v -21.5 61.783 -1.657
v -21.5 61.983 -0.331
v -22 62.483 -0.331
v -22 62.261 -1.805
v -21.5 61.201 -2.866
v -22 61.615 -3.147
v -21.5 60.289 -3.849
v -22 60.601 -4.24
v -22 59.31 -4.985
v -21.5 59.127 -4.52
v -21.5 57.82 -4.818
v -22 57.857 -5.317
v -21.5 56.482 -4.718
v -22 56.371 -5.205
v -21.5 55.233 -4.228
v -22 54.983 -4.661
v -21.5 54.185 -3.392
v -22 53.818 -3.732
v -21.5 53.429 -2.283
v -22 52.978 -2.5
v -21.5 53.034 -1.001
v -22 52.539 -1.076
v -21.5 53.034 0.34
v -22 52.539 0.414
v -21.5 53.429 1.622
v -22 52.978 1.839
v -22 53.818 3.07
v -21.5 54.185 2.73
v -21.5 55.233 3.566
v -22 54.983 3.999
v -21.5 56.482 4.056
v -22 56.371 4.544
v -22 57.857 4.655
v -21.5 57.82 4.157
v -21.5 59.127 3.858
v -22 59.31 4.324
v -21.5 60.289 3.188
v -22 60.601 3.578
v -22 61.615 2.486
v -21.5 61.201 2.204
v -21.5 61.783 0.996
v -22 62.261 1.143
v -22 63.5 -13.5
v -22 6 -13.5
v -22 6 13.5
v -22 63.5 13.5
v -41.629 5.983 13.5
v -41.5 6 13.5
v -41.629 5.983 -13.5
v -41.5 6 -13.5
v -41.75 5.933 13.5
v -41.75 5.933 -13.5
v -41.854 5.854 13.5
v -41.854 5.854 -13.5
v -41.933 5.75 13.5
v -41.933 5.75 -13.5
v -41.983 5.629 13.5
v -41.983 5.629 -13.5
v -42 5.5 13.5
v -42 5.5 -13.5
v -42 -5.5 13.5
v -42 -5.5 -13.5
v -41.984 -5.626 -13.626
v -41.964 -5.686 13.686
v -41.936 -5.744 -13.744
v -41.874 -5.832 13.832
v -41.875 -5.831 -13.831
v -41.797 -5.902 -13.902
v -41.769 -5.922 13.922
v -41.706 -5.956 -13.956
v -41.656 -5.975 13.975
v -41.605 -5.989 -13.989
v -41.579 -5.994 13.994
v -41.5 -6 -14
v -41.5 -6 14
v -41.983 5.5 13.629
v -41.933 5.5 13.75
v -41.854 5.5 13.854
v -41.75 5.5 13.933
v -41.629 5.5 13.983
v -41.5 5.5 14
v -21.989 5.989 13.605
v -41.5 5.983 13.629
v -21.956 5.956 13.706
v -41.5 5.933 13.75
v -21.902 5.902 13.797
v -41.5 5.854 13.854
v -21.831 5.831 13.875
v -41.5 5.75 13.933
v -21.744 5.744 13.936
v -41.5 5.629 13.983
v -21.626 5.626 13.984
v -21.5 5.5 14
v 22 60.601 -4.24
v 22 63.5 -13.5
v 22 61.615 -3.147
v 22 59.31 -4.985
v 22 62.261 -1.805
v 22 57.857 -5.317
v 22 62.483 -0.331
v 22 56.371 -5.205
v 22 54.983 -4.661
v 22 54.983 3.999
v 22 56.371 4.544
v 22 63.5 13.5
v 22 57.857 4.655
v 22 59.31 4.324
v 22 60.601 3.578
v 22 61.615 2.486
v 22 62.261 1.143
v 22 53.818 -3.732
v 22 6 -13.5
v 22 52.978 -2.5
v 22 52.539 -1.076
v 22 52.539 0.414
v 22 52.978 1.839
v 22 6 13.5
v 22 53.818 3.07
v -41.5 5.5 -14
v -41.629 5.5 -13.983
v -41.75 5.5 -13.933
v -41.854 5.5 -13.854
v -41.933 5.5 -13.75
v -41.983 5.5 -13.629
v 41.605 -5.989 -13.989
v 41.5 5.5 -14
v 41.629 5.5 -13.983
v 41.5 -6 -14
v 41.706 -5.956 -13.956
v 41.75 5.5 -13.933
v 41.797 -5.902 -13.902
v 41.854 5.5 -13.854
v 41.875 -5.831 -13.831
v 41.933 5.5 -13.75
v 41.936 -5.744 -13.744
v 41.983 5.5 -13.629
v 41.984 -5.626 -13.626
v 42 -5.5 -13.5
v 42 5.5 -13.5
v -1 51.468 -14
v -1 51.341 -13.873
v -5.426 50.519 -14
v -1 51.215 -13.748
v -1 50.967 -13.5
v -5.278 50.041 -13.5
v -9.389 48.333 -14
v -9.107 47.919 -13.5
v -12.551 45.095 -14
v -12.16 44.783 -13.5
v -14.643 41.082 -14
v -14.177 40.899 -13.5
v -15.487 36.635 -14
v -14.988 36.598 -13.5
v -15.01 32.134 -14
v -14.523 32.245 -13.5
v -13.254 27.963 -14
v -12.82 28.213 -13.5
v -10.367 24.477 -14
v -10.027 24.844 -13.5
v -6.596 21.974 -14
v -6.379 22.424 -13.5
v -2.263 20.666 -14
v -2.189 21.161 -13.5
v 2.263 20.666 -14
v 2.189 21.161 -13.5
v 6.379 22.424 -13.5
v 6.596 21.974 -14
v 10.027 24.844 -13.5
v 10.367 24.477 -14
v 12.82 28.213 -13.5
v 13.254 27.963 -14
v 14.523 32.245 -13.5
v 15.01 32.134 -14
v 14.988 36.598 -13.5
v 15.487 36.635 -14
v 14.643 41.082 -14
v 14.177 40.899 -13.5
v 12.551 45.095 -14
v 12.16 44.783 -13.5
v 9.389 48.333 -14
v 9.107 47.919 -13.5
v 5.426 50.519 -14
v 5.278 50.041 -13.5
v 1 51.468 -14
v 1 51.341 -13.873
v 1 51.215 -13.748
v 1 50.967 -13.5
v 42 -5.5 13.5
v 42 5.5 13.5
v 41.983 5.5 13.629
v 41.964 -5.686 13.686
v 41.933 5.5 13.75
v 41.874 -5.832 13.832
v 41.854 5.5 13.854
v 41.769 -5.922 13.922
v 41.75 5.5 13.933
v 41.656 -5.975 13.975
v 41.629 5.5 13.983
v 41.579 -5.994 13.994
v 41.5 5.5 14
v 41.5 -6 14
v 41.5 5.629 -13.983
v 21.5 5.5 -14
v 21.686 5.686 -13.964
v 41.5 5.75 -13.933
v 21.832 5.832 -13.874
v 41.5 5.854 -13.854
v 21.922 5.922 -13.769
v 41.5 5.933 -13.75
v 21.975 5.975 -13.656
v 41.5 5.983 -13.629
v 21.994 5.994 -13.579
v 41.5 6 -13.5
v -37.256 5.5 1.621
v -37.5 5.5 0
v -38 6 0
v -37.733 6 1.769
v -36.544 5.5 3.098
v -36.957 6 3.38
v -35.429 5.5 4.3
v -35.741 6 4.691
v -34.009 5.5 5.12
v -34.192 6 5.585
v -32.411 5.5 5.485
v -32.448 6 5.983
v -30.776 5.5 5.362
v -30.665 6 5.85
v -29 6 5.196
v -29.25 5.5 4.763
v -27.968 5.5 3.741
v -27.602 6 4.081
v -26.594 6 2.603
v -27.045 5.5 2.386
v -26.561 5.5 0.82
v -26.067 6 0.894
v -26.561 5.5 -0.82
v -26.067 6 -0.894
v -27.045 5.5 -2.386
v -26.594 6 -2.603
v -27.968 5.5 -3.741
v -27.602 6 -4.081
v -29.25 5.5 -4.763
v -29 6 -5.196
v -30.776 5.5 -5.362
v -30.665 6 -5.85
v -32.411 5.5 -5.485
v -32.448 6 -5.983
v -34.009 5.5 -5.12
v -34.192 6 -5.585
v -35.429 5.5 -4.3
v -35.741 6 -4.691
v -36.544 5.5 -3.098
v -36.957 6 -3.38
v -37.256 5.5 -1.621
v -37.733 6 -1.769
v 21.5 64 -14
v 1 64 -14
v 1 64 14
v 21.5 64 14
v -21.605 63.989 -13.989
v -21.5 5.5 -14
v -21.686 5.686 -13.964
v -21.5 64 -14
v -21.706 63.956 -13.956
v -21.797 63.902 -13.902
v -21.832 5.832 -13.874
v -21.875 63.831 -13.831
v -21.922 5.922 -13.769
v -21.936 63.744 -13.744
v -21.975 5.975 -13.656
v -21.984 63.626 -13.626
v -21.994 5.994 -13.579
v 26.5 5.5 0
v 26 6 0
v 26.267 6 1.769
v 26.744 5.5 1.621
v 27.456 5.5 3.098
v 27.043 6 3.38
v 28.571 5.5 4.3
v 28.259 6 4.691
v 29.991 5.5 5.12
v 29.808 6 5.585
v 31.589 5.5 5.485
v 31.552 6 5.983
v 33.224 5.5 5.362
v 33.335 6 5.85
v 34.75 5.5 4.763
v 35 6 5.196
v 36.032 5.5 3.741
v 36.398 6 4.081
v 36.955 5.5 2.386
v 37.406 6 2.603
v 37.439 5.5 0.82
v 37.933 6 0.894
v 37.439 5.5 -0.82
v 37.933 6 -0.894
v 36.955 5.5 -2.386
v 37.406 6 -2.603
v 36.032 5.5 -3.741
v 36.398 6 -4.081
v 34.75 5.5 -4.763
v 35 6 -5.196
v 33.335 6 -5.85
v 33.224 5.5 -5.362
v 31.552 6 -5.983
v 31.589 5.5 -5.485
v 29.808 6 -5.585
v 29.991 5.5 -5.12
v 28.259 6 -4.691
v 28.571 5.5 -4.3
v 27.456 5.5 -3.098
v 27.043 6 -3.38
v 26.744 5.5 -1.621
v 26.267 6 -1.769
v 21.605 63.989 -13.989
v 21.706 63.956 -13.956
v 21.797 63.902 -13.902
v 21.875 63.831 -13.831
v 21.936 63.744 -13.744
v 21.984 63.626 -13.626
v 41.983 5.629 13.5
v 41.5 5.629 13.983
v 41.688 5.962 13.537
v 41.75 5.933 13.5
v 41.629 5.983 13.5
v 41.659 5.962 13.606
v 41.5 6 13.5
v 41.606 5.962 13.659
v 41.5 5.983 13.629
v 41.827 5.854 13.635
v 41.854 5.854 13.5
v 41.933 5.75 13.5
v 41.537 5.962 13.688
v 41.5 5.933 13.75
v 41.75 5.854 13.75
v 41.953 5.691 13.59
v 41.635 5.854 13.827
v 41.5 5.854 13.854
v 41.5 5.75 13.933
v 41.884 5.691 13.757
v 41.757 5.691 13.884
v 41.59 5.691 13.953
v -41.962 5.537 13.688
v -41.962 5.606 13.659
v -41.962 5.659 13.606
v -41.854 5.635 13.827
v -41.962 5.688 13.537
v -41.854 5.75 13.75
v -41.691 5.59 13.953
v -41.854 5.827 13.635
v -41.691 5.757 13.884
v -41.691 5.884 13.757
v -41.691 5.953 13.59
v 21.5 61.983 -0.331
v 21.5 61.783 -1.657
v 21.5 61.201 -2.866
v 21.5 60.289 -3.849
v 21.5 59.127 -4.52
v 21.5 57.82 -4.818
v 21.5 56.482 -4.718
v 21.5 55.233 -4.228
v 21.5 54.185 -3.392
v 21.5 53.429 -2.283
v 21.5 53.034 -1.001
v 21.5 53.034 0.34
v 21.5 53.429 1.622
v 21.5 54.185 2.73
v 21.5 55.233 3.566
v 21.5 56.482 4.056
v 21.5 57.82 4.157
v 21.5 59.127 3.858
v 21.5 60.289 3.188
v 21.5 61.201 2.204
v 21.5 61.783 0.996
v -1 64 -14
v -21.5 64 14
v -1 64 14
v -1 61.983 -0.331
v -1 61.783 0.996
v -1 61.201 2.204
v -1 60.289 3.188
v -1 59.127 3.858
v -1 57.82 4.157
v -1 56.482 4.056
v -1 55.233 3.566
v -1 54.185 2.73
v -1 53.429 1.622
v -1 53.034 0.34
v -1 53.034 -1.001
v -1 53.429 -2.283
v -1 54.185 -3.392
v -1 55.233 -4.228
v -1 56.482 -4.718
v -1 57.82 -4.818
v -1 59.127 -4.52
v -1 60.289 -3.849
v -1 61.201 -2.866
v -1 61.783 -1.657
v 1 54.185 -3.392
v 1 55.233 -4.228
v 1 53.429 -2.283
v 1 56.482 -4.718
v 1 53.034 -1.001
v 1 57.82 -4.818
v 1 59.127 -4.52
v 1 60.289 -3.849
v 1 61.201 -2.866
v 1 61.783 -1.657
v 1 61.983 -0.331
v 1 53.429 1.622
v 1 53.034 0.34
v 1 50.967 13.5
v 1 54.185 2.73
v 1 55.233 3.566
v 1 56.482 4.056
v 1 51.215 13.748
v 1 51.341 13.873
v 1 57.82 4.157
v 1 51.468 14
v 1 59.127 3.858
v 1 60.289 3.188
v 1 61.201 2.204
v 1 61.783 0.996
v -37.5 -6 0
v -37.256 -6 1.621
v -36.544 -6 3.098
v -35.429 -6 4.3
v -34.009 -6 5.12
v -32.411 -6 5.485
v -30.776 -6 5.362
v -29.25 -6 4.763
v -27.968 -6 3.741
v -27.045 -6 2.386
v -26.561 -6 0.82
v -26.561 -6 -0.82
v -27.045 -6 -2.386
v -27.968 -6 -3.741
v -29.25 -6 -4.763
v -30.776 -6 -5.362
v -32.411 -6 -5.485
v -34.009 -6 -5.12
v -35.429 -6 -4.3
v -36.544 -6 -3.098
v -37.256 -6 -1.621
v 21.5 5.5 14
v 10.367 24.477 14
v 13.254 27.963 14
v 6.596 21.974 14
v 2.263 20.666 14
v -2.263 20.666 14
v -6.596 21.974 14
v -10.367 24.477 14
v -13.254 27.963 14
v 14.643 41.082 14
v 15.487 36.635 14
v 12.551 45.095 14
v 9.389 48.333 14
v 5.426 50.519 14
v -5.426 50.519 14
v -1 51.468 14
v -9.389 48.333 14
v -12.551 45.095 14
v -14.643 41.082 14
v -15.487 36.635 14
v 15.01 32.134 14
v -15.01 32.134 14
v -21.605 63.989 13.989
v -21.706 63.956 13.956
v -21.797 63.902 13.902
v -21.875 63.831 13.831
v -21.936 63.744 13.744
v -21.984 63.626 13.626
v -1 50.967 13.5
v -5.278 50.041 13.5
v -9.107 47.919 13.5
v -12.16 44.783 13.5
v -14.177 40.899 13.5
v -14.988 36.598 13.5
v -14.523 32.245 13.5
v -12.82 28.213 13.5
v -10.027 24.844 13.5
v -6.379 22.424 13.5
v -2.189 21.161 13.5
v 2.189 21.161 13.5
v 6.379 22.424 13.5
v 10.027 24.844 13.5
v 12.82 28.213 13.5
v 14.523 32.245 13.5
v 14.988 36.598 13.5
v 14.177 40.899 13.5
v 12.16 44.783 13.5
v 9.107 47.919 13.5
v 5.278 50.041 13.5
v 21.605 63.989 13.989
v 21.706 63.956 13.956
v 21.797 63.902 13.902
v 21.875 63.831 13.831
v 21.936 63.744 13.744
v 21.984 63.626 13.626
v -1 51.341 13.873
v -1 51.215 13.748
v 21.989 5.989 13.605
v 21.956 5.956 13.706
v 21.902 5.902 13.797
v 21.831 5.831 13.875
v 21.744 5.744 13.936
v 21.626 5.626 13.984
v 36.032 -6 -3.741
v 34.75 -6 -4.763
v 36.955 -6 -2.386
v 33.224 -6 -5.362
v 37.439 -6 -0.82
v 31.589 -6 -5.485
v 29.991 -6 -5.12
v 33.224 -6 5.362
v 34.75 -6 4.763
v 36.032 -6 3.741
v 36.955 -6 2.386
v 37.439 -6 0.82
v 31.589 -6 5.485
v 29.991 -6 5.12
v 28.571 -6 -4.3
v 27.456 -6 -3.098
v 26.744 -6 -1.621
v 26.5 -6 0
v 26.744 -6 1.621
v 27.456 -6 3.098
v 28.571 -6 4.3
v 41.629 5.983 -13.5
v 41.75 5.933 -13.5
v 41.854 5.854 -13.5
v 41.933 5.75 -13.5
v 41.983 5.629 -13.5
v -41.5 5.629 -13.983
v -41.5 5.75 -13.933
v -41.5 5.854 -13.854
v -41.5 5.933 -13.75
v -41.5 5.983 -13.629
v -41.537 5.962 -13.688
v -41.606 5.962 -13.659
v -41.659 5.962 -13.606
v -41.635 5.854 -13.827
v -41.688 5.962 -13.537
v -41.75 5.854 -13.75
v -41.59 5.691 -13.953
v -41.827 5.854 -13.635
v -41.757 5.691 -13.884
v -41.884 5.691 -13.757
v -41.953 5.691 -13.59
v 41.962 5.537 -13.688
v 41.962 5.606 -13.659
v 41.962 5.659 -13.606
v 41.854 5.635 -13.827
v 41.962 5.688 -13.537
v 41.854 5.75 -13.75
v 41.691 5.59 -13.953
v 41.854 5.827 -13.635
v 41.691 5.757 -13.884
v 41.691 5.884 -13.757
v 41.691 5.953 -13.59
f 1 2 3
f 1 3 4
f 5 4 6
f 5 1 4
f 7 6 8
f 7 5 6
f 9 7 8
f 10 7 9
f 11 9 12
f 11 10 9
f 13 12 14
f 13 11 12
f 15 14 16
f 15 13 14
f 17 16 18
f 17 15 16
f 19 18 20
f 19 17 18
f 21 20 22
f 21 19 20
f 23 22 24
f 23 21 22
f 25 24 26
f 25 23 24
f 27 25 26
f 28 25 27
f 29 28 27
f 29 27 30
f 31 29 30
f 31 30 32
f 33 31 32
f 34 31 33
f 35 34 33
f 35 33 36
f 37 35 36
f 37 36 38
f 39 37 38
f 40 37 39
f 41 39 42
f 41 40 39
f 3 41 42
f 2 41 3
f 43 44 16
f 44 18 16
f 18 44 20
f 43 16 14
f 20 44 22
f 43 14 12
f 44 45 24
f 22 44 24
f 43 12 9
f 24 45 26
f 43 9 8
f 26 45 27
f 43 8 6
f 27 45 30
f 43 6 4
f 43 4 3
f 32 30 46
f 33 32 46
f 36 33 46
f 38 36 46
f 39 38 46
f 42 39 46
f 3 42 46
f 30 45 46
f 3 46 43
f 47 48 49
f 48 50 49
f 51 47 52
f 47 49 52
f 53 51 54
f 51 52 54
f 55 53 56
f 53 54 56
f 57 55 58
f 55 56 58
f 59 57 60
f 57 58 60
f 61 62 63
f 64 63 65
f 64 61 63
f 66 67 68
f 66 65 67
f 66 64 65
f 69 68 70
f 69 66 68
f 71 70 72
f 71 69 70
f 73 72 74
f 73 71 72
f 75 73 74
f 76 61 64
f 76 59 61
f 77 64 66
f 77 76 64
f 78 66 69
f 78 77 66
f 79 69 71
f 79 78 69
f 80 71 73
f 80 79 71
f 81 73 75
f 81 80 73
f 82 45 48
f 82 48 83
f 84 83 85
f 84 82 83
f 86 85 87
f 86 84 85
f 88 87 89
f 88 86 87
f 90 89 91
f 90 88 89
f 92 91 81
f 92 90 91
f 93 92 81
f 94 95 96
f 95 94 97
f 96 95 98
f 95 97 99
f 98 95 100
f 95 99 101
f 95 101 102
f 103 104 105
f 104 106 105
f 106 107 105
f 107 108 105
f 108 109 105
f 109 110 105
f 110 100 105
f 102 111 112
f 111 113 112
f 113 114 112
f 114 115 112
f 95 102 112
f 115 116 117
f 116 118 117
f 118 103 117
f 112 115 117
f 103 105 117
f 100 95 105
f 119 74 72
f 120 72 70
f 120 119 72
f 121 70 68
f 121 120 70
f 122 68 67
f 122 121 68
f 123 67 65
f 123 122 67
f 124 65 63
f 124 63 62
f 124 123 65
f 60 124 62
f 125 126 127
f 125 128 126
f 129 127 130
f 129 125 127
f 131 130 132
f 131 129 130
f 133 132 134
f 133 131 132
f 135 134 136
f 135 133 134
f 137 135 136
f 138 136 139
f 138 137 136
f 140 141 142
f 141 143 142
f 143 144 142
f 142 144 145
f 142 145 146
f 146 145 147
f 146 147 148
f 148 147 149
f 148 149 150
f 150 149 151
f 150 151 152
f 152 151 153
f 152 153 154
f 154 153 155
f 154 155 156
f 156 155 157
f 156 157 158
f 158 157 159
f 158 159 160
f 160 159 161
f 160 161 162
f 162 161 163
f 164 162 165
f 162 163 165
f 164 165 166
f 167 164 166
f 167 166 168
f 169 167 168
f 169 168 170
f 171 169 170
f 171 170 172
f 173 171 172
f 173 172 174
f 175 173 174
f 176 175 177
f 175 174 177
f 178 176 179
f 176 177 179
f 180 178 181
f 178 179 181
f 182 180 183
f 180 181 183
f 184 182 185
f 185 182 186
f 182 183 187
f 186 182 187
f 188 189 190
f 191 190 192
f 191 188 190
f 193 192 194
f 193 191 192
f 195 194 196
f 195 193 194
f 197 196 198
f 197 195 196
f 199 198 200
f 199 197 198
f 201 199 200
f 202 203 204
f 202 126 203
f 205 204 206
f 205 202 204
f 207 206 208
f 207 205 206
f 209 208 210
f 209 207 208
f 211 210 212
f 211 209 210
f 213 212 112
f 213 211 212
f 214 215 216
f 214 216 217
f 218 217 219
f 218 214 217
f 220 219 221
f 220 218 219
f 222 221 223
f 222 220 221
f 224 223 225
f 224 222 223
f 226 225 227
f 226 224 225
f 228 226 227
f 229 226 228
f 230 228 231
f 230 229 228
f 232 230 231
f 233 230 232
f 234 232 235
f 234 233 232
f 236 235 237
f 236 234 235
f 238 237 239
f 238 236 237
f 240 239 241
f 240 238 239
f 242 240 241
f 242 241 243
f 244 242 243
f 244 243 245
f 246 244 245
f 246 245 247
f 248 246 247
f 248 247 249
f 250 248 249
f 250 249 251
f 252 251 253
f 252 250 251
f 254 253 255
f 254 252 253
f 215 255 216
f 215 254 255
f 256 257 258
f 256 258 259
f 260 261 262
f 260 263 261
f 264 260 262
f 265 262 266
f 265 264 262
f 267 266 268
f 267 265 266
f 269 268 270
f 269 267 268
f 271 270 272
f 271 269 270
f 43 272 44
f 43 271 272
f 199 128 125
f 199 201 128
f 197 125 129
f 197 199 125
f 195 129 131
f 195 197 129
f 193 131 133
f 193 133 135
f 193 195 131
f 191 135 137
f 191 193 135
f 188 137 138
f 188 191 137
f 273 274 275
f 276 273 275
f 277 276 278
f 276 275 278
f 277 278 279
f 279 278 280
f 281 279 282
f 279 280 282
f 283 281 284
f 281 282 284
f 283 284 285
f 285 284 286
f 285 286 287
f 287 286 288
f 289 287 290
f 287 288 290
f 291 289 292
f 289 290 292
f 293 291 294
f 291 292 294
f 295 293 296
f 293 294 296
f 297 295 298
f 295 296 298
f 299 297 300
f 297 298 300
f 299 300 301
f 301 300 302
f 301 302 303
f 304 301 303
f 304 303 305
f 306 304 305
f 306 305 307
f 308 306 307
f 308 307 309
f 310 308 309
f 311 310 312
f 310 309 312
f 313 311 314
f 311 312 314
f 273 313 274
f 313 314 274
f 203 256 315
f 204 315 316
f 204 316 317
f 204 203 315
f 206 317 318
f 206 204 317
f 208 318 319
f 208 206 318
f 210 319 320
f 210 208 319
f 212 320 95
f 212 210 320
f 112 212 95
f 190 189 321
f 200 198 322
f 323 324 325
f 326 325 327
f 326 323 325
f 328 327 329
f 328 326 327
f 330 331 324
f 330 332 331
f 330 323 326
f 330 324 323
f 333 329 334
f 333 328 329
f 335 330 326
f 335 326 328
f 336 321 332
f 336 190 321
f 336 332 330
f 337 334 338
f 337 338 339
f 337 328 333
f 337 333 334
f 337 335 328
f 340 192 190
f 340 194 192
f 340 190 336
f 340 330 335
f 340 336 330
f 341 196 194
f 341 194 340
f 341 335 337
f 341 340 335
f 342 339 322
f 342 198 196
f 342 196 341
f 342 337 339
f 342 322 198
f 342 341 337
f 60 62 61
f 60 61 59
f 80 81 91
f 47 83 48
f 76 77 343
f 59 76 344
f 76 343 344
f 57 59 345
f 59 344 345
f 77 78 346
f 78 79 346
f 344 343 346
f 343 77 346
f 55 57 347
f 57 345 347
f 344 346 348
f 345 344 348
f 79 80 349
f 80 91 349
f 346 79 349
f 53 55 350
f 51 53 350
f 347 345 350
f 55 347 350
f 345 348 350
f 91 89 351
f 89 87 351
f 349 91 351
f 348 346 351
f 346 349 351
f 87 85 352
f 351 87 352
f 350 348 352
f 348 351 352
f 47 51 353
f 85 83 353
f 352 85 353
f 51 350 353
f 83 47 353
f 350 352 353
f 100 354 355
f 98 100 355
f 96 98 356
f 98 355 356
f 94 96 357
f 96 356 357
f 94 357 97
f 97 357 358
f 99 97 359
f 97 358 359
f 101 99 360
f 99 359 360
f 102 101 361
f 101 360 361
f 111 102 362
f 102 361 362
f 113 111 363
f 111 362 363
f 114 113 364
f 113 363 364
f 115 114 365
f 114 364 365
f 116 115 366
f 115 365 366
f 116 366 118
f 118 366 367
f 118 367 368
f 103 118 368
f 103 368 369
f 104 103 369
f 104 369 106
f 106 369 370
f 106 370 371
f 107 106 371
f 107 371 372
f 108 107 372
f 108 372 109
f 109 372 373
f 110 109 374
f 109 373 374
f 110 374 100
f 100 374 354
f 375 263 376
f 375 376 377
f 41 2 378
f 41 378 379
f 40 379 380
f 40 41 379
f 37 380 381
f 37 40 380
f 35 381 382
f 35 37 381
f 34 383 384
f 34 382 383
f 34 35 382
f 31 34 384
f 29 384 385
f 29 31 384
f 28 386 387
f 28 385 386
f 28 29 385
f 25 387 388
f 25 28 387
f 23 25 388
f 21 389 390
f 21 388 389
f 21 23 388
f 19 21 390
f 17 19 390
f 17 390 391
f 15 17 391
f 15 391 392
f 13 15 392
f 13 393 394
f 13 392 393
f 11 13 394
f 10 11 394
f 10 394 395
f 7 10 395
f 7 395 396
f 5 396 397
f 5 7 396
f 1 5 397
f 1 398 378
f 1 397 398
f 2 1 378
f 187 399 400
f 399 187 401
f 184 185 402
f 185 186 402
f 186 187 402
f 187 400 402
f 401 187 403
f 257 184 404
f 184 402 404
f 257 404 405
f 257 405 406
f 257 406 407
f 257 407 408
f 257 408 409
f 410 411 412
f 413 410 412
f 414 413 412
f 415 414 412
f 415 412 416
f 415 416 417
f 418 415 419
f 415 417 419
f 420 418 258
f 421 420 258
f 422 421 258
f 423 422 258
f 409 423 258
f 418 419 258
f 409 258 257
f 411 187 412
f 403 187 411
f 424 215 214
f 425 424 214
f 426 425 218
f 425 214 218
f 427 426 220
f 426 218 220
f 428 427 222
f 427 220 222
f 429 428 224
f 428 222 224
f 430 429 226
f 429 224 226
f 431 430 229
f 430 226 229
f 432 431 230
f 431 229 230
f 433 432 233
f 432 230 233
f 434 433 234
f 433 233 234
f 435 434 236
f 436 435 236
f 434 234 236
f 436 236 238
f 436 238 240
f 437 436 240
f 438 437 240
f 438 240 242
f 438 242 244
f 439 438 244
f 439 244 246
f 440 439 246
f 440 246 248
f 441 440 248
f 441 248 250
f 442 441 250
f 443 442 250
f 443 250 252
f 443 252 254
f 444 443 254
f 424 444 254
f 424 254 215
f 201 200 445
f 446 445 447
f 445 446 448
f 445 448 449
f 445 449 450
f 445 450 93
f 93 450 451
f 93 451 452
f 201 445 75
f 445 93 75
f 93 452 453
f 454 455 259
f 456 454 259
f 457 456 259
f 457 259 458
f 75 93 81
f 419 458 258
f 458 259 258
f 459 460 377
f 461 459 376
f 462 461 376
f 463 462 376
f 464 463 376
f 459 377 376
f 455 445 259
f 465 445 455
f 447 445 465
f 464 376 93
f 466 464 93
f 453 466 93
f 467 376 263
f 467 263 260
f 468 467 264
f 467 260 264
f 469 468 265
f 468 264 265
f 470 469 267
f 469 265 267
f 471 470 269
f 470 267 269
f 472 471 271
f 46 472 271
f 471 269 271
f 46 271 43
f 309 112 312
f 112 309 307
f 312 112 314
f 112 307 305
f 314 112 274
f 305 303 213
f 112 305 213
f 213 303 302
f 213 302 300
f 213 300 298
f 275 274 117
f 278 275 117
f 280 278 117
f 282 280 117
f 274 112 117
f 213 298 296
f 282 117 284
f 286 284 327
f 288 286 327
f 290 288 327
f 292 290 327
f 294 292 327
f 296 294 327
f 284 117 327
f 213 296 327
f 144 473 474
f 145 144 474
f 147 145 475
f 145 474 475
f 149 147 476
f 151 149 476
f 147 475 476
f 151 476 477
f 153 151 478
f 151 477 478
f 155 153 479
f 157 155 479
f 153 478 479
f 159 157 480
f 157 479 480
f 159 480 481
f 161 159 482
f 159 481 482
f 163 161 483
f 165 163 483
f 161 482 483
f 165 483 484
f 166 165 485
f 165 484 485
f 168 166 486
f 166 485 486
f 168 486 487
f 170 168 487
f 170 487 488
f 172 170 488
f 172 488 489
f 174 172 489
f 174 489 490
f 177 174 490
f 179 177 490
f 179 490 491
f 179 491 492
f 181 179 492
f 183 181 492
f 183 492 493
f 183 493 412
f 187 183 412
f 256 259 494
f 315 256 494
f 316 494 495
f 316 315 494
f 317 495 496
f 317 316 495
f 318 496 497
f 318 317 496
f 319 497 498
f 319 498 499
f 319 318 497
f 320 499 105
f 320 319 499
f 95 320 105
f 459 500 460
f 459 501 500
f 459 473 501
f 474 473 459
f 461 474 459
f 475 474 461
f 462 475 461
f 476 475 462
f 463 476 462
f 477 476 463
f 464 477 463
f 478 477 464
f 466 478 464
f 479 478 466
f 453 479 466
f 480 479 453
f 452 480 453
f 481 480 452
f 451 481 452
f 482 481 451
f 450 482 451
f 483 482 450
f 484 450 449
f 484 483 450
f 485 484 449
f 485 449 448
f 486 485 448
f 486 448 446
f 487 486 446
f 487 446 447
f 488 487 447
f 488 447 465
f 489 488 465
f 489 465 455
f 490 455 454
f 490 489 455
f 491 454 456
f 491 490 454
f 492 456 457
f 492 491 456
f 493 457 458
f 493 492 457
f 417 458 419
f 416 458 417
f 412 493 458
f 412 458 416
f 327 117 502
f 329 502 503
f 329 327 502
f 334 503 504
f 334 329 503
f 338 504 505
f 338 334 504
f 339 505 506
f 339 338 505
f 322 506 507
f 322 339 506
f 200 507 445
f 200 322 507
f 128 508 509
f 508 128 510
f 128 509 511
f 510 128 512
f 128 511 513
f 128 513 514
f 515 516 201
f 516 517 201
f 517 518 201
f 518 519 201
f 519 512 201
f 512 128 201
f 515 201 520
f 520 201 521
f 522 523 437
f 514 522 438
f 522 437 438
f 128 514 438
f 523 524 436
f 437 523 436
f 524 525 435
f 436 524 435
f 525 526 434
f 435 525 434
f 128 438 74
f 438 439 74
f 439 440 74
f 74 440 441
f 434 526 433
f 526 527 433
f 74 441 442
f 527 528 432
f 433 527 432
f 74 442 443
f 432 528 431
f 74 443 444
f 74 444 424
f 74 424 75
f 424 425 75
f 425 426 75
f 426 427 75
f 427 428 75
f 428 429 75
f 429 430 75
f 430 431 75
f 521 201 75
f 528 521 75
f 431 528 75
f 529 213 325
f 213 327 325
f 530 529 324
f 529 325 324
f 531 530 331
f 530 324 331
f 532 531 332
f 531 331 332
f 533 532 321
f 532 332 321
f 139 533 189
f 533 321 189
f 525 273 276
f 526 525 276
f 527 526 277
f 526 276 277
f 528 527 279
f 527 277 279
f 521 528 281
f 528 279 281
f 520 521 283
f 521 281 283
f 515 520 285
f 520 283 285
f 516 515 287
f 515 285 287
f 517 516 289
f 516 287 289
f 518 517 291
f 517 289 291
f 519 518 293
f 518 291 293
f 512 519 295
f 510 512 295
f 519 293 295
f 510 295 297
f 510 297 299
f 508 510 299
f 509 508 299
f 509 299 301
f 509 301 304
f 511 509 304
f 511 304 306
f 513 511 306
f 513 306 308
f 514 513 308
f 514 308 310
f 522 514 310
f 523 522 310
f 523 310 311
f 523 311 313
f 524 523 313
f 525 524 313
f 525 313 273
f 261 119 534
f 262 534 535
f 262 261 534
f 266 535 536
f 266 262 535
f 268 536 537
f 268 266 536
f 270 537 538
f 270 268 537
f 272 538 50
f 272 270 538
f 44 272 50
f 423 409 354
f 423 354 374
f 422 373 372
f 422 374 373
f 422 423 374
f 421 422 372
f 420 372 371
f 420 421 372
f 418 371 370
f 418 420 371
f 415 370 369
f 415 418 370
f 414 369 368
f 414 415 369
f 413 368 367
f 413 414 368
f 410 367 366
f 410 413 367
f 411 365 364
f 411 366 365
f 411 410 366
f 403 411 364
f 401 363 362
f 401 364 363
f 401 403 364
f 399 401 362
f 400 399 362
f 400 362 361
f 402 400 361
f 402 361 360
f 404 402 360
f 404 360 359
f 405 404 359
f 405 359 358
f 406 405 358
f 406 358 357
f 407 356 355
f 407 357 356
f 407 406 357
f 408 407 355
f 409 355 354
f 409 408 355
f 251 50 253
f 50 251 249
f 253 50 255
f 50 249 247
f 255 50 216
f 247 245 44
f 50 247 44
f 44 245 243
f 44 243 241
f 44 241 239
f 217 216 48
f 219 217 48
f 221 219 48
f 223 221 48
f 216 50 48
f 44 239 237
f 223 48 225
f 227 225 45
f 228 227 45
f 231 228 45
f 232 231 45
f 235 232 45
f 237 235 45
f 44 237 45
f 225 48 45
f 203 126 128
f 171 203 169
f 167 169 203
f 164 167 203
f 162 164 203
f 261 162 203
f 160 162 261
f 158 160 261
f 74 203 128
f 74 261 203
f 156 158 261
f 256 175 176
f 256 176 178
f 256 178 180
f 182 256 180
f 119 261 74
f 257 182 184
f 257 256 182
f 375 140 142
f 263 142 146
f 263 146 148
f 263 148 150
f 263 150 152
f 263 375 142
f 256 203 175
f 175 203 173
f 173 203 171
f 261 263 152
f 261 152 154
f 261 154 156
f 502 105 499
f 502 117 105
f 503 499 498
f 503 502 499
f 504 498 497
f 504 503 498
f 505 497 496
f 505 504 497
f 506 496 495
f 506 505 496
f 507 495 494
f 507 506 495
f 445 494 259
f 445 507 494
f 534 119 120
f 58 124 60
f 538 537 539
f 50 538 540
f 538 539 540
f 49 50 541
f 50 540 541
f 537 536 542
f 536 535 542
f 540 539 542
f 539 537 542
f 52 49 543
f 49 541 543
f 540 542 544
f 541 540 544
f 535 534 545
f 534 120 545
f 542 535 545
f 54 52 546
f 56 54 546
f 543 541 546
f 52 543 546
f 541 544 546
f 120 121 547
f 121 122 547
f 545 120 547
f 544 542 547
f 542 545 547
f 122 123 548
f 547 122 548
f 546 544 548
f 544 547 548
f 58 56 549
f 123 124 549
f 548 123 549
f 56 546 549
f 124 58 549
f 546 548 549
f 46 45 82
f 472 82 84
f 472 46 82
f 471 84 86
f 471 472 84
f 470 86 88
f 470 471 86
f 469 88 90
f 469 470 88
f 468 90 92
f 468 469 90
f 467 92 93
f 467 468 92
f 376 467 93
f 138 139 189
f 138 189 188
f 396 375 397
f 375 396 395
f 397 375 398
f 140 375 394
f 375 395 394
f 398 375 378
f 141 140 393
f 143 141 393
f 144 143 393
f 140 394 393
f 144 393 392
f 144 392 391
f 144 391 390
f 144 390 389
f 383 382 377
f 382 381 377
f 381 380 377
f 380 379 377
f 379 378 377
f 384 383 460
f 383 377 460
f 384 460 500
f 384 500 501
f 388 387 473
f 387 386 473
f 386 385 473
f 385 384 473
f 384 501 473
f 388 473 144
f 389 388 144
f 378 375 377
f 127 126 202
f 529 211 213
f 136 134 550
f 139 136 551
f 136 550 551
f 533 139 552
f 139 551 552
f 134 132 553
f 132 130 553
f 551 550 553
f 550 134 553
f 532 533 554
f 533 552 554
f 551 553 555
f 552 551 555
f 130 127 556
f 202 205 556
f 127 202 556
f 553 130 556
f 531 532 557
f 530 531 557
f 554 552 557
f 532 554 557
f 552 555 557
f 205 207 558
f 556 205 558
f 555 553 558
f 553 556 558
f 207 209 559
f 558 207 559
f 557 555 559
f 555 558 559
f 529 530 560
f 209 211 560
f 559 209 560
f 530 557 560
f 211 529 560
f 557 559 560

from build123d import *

# Parameters (mm, degrees)
BOSS_EXTRUDE1_DEPTH     = 14
SKETCH2_R               = 5.5
CUT_EXTRUDE1_DEPTH      = 73.965745388
CUT_EXTRUDE2_DEPTH      = 79.364532794
CUT_EXTRUDE2_DEPTH_BACK = 79.364532794
SKETCH5_R               = 4.5
CHAMFER2_SIZE           = 0.5
FILLET2_R               = 0.5


with BuildPart() as part:
    # Sketch1 → Boss-Extrude1 (new, symmetric)
    with BuildSketch(Plane.XY):
        with BuildLine():
            Line((-42, -6), (-42, 6))
            Line((-42, 6), (-22, 6))
            Line((-22, 6), (-22, 64))
            Line((-22, 64), (-1, 64))
            Line((-1, 64), (-1, 50.966629547))
            ThreePointArc((-1, 50.966629547), (0, 21), (1, 50.966629547))
            Line((1, 50.966629547), (1, 64))
            Line((1, 64), (22, 64))
            Line((22, 64), (22, 6))
            Line((22, 6), (42, 6))
            Line((42, 6), (42, -6))
            Line((42, -6), (-42, -6))
        make_face()
    extrude(amount=BOSS_EXTRUDE1_DEPTH, both=True)

    # Sketch2 → Cut-Extrude1 (cut, through all)
    with BuildSketch(Plane(origin=(0, 6, 0), x_dir=(1, 0, 0), z_dir=(0, 1, 0))):
        with Locations(Location((32, 0, 0), (0, 0, 180))):
            Circle(SKETCH2_R)
        with Locations(Location((-32, 0, 0), (0, 0, 180))):
            Circle(SKETCH2_R)
    extrude(amount=-CUT_EXTRUDE1_DEPTH, mode=Mode.SUBTRACT)

    # Sketch5 → Cut-Extrude2 (cut, two sides: drawn at the far end of the back side and taken through both)
    with BuildSketch(Plane(origin=(-1, 0, 0), x_dir=(0, 0, -1), z_dir=(1, 0, 0)).offset(-CUT_EXTRUDE2_DEPTH_BACK)):
        with Locations(Location((0.330734984, 57.483314774, 0), (0, 0, 90))):
            Circle(SKETCH5_R)
    extrude(amount=CUT_EXTRUDE2_DEPTH + CUT_EXTRUDE2_DEPTH_BACK, mode=Mode.SUBTRACT)

    # Chamfer2
    chamfer2_edges = [part.edges().sort_by_distance(p)[0] for p in [
        (0, 21, -14),
        (0, 21, 14),
        (37.5, 6, 0),
        (-26.5, 6, 0),
        (-22, 52.983314774, -0.330734984),
        (22, 52.983314774, -0.330734984),
    ]]
    chamfer(chamfer2_edges, length=CHAMFER2_SIZE)

    # Fillet2
    fillet2_edges = [part.edges().sort_by_distance(p)[0] for p in [
        (-32, 6, 14),
        (22, 35, -14),
        (32, 6, -14),
        (-42, 0, 14),
        (42, 0, -14),
        (-42, 0, -14),
        (-32, 6, -14),
        (-22, 35, -14),
        (42, 0, 14),
        (22, 64, 0),
        (42, 6, 0),
        (42, -6, 0),
        (-42, -6, 0),
        (-42, 6, 0),
        (-22, 64, 0),
        (32, 6, 14),
        (22, 35, 14),
        (-22, 35, 14),
    ]]
    fillet(fillet2_edges, radius=FILLET2_R)


solid = part.part
